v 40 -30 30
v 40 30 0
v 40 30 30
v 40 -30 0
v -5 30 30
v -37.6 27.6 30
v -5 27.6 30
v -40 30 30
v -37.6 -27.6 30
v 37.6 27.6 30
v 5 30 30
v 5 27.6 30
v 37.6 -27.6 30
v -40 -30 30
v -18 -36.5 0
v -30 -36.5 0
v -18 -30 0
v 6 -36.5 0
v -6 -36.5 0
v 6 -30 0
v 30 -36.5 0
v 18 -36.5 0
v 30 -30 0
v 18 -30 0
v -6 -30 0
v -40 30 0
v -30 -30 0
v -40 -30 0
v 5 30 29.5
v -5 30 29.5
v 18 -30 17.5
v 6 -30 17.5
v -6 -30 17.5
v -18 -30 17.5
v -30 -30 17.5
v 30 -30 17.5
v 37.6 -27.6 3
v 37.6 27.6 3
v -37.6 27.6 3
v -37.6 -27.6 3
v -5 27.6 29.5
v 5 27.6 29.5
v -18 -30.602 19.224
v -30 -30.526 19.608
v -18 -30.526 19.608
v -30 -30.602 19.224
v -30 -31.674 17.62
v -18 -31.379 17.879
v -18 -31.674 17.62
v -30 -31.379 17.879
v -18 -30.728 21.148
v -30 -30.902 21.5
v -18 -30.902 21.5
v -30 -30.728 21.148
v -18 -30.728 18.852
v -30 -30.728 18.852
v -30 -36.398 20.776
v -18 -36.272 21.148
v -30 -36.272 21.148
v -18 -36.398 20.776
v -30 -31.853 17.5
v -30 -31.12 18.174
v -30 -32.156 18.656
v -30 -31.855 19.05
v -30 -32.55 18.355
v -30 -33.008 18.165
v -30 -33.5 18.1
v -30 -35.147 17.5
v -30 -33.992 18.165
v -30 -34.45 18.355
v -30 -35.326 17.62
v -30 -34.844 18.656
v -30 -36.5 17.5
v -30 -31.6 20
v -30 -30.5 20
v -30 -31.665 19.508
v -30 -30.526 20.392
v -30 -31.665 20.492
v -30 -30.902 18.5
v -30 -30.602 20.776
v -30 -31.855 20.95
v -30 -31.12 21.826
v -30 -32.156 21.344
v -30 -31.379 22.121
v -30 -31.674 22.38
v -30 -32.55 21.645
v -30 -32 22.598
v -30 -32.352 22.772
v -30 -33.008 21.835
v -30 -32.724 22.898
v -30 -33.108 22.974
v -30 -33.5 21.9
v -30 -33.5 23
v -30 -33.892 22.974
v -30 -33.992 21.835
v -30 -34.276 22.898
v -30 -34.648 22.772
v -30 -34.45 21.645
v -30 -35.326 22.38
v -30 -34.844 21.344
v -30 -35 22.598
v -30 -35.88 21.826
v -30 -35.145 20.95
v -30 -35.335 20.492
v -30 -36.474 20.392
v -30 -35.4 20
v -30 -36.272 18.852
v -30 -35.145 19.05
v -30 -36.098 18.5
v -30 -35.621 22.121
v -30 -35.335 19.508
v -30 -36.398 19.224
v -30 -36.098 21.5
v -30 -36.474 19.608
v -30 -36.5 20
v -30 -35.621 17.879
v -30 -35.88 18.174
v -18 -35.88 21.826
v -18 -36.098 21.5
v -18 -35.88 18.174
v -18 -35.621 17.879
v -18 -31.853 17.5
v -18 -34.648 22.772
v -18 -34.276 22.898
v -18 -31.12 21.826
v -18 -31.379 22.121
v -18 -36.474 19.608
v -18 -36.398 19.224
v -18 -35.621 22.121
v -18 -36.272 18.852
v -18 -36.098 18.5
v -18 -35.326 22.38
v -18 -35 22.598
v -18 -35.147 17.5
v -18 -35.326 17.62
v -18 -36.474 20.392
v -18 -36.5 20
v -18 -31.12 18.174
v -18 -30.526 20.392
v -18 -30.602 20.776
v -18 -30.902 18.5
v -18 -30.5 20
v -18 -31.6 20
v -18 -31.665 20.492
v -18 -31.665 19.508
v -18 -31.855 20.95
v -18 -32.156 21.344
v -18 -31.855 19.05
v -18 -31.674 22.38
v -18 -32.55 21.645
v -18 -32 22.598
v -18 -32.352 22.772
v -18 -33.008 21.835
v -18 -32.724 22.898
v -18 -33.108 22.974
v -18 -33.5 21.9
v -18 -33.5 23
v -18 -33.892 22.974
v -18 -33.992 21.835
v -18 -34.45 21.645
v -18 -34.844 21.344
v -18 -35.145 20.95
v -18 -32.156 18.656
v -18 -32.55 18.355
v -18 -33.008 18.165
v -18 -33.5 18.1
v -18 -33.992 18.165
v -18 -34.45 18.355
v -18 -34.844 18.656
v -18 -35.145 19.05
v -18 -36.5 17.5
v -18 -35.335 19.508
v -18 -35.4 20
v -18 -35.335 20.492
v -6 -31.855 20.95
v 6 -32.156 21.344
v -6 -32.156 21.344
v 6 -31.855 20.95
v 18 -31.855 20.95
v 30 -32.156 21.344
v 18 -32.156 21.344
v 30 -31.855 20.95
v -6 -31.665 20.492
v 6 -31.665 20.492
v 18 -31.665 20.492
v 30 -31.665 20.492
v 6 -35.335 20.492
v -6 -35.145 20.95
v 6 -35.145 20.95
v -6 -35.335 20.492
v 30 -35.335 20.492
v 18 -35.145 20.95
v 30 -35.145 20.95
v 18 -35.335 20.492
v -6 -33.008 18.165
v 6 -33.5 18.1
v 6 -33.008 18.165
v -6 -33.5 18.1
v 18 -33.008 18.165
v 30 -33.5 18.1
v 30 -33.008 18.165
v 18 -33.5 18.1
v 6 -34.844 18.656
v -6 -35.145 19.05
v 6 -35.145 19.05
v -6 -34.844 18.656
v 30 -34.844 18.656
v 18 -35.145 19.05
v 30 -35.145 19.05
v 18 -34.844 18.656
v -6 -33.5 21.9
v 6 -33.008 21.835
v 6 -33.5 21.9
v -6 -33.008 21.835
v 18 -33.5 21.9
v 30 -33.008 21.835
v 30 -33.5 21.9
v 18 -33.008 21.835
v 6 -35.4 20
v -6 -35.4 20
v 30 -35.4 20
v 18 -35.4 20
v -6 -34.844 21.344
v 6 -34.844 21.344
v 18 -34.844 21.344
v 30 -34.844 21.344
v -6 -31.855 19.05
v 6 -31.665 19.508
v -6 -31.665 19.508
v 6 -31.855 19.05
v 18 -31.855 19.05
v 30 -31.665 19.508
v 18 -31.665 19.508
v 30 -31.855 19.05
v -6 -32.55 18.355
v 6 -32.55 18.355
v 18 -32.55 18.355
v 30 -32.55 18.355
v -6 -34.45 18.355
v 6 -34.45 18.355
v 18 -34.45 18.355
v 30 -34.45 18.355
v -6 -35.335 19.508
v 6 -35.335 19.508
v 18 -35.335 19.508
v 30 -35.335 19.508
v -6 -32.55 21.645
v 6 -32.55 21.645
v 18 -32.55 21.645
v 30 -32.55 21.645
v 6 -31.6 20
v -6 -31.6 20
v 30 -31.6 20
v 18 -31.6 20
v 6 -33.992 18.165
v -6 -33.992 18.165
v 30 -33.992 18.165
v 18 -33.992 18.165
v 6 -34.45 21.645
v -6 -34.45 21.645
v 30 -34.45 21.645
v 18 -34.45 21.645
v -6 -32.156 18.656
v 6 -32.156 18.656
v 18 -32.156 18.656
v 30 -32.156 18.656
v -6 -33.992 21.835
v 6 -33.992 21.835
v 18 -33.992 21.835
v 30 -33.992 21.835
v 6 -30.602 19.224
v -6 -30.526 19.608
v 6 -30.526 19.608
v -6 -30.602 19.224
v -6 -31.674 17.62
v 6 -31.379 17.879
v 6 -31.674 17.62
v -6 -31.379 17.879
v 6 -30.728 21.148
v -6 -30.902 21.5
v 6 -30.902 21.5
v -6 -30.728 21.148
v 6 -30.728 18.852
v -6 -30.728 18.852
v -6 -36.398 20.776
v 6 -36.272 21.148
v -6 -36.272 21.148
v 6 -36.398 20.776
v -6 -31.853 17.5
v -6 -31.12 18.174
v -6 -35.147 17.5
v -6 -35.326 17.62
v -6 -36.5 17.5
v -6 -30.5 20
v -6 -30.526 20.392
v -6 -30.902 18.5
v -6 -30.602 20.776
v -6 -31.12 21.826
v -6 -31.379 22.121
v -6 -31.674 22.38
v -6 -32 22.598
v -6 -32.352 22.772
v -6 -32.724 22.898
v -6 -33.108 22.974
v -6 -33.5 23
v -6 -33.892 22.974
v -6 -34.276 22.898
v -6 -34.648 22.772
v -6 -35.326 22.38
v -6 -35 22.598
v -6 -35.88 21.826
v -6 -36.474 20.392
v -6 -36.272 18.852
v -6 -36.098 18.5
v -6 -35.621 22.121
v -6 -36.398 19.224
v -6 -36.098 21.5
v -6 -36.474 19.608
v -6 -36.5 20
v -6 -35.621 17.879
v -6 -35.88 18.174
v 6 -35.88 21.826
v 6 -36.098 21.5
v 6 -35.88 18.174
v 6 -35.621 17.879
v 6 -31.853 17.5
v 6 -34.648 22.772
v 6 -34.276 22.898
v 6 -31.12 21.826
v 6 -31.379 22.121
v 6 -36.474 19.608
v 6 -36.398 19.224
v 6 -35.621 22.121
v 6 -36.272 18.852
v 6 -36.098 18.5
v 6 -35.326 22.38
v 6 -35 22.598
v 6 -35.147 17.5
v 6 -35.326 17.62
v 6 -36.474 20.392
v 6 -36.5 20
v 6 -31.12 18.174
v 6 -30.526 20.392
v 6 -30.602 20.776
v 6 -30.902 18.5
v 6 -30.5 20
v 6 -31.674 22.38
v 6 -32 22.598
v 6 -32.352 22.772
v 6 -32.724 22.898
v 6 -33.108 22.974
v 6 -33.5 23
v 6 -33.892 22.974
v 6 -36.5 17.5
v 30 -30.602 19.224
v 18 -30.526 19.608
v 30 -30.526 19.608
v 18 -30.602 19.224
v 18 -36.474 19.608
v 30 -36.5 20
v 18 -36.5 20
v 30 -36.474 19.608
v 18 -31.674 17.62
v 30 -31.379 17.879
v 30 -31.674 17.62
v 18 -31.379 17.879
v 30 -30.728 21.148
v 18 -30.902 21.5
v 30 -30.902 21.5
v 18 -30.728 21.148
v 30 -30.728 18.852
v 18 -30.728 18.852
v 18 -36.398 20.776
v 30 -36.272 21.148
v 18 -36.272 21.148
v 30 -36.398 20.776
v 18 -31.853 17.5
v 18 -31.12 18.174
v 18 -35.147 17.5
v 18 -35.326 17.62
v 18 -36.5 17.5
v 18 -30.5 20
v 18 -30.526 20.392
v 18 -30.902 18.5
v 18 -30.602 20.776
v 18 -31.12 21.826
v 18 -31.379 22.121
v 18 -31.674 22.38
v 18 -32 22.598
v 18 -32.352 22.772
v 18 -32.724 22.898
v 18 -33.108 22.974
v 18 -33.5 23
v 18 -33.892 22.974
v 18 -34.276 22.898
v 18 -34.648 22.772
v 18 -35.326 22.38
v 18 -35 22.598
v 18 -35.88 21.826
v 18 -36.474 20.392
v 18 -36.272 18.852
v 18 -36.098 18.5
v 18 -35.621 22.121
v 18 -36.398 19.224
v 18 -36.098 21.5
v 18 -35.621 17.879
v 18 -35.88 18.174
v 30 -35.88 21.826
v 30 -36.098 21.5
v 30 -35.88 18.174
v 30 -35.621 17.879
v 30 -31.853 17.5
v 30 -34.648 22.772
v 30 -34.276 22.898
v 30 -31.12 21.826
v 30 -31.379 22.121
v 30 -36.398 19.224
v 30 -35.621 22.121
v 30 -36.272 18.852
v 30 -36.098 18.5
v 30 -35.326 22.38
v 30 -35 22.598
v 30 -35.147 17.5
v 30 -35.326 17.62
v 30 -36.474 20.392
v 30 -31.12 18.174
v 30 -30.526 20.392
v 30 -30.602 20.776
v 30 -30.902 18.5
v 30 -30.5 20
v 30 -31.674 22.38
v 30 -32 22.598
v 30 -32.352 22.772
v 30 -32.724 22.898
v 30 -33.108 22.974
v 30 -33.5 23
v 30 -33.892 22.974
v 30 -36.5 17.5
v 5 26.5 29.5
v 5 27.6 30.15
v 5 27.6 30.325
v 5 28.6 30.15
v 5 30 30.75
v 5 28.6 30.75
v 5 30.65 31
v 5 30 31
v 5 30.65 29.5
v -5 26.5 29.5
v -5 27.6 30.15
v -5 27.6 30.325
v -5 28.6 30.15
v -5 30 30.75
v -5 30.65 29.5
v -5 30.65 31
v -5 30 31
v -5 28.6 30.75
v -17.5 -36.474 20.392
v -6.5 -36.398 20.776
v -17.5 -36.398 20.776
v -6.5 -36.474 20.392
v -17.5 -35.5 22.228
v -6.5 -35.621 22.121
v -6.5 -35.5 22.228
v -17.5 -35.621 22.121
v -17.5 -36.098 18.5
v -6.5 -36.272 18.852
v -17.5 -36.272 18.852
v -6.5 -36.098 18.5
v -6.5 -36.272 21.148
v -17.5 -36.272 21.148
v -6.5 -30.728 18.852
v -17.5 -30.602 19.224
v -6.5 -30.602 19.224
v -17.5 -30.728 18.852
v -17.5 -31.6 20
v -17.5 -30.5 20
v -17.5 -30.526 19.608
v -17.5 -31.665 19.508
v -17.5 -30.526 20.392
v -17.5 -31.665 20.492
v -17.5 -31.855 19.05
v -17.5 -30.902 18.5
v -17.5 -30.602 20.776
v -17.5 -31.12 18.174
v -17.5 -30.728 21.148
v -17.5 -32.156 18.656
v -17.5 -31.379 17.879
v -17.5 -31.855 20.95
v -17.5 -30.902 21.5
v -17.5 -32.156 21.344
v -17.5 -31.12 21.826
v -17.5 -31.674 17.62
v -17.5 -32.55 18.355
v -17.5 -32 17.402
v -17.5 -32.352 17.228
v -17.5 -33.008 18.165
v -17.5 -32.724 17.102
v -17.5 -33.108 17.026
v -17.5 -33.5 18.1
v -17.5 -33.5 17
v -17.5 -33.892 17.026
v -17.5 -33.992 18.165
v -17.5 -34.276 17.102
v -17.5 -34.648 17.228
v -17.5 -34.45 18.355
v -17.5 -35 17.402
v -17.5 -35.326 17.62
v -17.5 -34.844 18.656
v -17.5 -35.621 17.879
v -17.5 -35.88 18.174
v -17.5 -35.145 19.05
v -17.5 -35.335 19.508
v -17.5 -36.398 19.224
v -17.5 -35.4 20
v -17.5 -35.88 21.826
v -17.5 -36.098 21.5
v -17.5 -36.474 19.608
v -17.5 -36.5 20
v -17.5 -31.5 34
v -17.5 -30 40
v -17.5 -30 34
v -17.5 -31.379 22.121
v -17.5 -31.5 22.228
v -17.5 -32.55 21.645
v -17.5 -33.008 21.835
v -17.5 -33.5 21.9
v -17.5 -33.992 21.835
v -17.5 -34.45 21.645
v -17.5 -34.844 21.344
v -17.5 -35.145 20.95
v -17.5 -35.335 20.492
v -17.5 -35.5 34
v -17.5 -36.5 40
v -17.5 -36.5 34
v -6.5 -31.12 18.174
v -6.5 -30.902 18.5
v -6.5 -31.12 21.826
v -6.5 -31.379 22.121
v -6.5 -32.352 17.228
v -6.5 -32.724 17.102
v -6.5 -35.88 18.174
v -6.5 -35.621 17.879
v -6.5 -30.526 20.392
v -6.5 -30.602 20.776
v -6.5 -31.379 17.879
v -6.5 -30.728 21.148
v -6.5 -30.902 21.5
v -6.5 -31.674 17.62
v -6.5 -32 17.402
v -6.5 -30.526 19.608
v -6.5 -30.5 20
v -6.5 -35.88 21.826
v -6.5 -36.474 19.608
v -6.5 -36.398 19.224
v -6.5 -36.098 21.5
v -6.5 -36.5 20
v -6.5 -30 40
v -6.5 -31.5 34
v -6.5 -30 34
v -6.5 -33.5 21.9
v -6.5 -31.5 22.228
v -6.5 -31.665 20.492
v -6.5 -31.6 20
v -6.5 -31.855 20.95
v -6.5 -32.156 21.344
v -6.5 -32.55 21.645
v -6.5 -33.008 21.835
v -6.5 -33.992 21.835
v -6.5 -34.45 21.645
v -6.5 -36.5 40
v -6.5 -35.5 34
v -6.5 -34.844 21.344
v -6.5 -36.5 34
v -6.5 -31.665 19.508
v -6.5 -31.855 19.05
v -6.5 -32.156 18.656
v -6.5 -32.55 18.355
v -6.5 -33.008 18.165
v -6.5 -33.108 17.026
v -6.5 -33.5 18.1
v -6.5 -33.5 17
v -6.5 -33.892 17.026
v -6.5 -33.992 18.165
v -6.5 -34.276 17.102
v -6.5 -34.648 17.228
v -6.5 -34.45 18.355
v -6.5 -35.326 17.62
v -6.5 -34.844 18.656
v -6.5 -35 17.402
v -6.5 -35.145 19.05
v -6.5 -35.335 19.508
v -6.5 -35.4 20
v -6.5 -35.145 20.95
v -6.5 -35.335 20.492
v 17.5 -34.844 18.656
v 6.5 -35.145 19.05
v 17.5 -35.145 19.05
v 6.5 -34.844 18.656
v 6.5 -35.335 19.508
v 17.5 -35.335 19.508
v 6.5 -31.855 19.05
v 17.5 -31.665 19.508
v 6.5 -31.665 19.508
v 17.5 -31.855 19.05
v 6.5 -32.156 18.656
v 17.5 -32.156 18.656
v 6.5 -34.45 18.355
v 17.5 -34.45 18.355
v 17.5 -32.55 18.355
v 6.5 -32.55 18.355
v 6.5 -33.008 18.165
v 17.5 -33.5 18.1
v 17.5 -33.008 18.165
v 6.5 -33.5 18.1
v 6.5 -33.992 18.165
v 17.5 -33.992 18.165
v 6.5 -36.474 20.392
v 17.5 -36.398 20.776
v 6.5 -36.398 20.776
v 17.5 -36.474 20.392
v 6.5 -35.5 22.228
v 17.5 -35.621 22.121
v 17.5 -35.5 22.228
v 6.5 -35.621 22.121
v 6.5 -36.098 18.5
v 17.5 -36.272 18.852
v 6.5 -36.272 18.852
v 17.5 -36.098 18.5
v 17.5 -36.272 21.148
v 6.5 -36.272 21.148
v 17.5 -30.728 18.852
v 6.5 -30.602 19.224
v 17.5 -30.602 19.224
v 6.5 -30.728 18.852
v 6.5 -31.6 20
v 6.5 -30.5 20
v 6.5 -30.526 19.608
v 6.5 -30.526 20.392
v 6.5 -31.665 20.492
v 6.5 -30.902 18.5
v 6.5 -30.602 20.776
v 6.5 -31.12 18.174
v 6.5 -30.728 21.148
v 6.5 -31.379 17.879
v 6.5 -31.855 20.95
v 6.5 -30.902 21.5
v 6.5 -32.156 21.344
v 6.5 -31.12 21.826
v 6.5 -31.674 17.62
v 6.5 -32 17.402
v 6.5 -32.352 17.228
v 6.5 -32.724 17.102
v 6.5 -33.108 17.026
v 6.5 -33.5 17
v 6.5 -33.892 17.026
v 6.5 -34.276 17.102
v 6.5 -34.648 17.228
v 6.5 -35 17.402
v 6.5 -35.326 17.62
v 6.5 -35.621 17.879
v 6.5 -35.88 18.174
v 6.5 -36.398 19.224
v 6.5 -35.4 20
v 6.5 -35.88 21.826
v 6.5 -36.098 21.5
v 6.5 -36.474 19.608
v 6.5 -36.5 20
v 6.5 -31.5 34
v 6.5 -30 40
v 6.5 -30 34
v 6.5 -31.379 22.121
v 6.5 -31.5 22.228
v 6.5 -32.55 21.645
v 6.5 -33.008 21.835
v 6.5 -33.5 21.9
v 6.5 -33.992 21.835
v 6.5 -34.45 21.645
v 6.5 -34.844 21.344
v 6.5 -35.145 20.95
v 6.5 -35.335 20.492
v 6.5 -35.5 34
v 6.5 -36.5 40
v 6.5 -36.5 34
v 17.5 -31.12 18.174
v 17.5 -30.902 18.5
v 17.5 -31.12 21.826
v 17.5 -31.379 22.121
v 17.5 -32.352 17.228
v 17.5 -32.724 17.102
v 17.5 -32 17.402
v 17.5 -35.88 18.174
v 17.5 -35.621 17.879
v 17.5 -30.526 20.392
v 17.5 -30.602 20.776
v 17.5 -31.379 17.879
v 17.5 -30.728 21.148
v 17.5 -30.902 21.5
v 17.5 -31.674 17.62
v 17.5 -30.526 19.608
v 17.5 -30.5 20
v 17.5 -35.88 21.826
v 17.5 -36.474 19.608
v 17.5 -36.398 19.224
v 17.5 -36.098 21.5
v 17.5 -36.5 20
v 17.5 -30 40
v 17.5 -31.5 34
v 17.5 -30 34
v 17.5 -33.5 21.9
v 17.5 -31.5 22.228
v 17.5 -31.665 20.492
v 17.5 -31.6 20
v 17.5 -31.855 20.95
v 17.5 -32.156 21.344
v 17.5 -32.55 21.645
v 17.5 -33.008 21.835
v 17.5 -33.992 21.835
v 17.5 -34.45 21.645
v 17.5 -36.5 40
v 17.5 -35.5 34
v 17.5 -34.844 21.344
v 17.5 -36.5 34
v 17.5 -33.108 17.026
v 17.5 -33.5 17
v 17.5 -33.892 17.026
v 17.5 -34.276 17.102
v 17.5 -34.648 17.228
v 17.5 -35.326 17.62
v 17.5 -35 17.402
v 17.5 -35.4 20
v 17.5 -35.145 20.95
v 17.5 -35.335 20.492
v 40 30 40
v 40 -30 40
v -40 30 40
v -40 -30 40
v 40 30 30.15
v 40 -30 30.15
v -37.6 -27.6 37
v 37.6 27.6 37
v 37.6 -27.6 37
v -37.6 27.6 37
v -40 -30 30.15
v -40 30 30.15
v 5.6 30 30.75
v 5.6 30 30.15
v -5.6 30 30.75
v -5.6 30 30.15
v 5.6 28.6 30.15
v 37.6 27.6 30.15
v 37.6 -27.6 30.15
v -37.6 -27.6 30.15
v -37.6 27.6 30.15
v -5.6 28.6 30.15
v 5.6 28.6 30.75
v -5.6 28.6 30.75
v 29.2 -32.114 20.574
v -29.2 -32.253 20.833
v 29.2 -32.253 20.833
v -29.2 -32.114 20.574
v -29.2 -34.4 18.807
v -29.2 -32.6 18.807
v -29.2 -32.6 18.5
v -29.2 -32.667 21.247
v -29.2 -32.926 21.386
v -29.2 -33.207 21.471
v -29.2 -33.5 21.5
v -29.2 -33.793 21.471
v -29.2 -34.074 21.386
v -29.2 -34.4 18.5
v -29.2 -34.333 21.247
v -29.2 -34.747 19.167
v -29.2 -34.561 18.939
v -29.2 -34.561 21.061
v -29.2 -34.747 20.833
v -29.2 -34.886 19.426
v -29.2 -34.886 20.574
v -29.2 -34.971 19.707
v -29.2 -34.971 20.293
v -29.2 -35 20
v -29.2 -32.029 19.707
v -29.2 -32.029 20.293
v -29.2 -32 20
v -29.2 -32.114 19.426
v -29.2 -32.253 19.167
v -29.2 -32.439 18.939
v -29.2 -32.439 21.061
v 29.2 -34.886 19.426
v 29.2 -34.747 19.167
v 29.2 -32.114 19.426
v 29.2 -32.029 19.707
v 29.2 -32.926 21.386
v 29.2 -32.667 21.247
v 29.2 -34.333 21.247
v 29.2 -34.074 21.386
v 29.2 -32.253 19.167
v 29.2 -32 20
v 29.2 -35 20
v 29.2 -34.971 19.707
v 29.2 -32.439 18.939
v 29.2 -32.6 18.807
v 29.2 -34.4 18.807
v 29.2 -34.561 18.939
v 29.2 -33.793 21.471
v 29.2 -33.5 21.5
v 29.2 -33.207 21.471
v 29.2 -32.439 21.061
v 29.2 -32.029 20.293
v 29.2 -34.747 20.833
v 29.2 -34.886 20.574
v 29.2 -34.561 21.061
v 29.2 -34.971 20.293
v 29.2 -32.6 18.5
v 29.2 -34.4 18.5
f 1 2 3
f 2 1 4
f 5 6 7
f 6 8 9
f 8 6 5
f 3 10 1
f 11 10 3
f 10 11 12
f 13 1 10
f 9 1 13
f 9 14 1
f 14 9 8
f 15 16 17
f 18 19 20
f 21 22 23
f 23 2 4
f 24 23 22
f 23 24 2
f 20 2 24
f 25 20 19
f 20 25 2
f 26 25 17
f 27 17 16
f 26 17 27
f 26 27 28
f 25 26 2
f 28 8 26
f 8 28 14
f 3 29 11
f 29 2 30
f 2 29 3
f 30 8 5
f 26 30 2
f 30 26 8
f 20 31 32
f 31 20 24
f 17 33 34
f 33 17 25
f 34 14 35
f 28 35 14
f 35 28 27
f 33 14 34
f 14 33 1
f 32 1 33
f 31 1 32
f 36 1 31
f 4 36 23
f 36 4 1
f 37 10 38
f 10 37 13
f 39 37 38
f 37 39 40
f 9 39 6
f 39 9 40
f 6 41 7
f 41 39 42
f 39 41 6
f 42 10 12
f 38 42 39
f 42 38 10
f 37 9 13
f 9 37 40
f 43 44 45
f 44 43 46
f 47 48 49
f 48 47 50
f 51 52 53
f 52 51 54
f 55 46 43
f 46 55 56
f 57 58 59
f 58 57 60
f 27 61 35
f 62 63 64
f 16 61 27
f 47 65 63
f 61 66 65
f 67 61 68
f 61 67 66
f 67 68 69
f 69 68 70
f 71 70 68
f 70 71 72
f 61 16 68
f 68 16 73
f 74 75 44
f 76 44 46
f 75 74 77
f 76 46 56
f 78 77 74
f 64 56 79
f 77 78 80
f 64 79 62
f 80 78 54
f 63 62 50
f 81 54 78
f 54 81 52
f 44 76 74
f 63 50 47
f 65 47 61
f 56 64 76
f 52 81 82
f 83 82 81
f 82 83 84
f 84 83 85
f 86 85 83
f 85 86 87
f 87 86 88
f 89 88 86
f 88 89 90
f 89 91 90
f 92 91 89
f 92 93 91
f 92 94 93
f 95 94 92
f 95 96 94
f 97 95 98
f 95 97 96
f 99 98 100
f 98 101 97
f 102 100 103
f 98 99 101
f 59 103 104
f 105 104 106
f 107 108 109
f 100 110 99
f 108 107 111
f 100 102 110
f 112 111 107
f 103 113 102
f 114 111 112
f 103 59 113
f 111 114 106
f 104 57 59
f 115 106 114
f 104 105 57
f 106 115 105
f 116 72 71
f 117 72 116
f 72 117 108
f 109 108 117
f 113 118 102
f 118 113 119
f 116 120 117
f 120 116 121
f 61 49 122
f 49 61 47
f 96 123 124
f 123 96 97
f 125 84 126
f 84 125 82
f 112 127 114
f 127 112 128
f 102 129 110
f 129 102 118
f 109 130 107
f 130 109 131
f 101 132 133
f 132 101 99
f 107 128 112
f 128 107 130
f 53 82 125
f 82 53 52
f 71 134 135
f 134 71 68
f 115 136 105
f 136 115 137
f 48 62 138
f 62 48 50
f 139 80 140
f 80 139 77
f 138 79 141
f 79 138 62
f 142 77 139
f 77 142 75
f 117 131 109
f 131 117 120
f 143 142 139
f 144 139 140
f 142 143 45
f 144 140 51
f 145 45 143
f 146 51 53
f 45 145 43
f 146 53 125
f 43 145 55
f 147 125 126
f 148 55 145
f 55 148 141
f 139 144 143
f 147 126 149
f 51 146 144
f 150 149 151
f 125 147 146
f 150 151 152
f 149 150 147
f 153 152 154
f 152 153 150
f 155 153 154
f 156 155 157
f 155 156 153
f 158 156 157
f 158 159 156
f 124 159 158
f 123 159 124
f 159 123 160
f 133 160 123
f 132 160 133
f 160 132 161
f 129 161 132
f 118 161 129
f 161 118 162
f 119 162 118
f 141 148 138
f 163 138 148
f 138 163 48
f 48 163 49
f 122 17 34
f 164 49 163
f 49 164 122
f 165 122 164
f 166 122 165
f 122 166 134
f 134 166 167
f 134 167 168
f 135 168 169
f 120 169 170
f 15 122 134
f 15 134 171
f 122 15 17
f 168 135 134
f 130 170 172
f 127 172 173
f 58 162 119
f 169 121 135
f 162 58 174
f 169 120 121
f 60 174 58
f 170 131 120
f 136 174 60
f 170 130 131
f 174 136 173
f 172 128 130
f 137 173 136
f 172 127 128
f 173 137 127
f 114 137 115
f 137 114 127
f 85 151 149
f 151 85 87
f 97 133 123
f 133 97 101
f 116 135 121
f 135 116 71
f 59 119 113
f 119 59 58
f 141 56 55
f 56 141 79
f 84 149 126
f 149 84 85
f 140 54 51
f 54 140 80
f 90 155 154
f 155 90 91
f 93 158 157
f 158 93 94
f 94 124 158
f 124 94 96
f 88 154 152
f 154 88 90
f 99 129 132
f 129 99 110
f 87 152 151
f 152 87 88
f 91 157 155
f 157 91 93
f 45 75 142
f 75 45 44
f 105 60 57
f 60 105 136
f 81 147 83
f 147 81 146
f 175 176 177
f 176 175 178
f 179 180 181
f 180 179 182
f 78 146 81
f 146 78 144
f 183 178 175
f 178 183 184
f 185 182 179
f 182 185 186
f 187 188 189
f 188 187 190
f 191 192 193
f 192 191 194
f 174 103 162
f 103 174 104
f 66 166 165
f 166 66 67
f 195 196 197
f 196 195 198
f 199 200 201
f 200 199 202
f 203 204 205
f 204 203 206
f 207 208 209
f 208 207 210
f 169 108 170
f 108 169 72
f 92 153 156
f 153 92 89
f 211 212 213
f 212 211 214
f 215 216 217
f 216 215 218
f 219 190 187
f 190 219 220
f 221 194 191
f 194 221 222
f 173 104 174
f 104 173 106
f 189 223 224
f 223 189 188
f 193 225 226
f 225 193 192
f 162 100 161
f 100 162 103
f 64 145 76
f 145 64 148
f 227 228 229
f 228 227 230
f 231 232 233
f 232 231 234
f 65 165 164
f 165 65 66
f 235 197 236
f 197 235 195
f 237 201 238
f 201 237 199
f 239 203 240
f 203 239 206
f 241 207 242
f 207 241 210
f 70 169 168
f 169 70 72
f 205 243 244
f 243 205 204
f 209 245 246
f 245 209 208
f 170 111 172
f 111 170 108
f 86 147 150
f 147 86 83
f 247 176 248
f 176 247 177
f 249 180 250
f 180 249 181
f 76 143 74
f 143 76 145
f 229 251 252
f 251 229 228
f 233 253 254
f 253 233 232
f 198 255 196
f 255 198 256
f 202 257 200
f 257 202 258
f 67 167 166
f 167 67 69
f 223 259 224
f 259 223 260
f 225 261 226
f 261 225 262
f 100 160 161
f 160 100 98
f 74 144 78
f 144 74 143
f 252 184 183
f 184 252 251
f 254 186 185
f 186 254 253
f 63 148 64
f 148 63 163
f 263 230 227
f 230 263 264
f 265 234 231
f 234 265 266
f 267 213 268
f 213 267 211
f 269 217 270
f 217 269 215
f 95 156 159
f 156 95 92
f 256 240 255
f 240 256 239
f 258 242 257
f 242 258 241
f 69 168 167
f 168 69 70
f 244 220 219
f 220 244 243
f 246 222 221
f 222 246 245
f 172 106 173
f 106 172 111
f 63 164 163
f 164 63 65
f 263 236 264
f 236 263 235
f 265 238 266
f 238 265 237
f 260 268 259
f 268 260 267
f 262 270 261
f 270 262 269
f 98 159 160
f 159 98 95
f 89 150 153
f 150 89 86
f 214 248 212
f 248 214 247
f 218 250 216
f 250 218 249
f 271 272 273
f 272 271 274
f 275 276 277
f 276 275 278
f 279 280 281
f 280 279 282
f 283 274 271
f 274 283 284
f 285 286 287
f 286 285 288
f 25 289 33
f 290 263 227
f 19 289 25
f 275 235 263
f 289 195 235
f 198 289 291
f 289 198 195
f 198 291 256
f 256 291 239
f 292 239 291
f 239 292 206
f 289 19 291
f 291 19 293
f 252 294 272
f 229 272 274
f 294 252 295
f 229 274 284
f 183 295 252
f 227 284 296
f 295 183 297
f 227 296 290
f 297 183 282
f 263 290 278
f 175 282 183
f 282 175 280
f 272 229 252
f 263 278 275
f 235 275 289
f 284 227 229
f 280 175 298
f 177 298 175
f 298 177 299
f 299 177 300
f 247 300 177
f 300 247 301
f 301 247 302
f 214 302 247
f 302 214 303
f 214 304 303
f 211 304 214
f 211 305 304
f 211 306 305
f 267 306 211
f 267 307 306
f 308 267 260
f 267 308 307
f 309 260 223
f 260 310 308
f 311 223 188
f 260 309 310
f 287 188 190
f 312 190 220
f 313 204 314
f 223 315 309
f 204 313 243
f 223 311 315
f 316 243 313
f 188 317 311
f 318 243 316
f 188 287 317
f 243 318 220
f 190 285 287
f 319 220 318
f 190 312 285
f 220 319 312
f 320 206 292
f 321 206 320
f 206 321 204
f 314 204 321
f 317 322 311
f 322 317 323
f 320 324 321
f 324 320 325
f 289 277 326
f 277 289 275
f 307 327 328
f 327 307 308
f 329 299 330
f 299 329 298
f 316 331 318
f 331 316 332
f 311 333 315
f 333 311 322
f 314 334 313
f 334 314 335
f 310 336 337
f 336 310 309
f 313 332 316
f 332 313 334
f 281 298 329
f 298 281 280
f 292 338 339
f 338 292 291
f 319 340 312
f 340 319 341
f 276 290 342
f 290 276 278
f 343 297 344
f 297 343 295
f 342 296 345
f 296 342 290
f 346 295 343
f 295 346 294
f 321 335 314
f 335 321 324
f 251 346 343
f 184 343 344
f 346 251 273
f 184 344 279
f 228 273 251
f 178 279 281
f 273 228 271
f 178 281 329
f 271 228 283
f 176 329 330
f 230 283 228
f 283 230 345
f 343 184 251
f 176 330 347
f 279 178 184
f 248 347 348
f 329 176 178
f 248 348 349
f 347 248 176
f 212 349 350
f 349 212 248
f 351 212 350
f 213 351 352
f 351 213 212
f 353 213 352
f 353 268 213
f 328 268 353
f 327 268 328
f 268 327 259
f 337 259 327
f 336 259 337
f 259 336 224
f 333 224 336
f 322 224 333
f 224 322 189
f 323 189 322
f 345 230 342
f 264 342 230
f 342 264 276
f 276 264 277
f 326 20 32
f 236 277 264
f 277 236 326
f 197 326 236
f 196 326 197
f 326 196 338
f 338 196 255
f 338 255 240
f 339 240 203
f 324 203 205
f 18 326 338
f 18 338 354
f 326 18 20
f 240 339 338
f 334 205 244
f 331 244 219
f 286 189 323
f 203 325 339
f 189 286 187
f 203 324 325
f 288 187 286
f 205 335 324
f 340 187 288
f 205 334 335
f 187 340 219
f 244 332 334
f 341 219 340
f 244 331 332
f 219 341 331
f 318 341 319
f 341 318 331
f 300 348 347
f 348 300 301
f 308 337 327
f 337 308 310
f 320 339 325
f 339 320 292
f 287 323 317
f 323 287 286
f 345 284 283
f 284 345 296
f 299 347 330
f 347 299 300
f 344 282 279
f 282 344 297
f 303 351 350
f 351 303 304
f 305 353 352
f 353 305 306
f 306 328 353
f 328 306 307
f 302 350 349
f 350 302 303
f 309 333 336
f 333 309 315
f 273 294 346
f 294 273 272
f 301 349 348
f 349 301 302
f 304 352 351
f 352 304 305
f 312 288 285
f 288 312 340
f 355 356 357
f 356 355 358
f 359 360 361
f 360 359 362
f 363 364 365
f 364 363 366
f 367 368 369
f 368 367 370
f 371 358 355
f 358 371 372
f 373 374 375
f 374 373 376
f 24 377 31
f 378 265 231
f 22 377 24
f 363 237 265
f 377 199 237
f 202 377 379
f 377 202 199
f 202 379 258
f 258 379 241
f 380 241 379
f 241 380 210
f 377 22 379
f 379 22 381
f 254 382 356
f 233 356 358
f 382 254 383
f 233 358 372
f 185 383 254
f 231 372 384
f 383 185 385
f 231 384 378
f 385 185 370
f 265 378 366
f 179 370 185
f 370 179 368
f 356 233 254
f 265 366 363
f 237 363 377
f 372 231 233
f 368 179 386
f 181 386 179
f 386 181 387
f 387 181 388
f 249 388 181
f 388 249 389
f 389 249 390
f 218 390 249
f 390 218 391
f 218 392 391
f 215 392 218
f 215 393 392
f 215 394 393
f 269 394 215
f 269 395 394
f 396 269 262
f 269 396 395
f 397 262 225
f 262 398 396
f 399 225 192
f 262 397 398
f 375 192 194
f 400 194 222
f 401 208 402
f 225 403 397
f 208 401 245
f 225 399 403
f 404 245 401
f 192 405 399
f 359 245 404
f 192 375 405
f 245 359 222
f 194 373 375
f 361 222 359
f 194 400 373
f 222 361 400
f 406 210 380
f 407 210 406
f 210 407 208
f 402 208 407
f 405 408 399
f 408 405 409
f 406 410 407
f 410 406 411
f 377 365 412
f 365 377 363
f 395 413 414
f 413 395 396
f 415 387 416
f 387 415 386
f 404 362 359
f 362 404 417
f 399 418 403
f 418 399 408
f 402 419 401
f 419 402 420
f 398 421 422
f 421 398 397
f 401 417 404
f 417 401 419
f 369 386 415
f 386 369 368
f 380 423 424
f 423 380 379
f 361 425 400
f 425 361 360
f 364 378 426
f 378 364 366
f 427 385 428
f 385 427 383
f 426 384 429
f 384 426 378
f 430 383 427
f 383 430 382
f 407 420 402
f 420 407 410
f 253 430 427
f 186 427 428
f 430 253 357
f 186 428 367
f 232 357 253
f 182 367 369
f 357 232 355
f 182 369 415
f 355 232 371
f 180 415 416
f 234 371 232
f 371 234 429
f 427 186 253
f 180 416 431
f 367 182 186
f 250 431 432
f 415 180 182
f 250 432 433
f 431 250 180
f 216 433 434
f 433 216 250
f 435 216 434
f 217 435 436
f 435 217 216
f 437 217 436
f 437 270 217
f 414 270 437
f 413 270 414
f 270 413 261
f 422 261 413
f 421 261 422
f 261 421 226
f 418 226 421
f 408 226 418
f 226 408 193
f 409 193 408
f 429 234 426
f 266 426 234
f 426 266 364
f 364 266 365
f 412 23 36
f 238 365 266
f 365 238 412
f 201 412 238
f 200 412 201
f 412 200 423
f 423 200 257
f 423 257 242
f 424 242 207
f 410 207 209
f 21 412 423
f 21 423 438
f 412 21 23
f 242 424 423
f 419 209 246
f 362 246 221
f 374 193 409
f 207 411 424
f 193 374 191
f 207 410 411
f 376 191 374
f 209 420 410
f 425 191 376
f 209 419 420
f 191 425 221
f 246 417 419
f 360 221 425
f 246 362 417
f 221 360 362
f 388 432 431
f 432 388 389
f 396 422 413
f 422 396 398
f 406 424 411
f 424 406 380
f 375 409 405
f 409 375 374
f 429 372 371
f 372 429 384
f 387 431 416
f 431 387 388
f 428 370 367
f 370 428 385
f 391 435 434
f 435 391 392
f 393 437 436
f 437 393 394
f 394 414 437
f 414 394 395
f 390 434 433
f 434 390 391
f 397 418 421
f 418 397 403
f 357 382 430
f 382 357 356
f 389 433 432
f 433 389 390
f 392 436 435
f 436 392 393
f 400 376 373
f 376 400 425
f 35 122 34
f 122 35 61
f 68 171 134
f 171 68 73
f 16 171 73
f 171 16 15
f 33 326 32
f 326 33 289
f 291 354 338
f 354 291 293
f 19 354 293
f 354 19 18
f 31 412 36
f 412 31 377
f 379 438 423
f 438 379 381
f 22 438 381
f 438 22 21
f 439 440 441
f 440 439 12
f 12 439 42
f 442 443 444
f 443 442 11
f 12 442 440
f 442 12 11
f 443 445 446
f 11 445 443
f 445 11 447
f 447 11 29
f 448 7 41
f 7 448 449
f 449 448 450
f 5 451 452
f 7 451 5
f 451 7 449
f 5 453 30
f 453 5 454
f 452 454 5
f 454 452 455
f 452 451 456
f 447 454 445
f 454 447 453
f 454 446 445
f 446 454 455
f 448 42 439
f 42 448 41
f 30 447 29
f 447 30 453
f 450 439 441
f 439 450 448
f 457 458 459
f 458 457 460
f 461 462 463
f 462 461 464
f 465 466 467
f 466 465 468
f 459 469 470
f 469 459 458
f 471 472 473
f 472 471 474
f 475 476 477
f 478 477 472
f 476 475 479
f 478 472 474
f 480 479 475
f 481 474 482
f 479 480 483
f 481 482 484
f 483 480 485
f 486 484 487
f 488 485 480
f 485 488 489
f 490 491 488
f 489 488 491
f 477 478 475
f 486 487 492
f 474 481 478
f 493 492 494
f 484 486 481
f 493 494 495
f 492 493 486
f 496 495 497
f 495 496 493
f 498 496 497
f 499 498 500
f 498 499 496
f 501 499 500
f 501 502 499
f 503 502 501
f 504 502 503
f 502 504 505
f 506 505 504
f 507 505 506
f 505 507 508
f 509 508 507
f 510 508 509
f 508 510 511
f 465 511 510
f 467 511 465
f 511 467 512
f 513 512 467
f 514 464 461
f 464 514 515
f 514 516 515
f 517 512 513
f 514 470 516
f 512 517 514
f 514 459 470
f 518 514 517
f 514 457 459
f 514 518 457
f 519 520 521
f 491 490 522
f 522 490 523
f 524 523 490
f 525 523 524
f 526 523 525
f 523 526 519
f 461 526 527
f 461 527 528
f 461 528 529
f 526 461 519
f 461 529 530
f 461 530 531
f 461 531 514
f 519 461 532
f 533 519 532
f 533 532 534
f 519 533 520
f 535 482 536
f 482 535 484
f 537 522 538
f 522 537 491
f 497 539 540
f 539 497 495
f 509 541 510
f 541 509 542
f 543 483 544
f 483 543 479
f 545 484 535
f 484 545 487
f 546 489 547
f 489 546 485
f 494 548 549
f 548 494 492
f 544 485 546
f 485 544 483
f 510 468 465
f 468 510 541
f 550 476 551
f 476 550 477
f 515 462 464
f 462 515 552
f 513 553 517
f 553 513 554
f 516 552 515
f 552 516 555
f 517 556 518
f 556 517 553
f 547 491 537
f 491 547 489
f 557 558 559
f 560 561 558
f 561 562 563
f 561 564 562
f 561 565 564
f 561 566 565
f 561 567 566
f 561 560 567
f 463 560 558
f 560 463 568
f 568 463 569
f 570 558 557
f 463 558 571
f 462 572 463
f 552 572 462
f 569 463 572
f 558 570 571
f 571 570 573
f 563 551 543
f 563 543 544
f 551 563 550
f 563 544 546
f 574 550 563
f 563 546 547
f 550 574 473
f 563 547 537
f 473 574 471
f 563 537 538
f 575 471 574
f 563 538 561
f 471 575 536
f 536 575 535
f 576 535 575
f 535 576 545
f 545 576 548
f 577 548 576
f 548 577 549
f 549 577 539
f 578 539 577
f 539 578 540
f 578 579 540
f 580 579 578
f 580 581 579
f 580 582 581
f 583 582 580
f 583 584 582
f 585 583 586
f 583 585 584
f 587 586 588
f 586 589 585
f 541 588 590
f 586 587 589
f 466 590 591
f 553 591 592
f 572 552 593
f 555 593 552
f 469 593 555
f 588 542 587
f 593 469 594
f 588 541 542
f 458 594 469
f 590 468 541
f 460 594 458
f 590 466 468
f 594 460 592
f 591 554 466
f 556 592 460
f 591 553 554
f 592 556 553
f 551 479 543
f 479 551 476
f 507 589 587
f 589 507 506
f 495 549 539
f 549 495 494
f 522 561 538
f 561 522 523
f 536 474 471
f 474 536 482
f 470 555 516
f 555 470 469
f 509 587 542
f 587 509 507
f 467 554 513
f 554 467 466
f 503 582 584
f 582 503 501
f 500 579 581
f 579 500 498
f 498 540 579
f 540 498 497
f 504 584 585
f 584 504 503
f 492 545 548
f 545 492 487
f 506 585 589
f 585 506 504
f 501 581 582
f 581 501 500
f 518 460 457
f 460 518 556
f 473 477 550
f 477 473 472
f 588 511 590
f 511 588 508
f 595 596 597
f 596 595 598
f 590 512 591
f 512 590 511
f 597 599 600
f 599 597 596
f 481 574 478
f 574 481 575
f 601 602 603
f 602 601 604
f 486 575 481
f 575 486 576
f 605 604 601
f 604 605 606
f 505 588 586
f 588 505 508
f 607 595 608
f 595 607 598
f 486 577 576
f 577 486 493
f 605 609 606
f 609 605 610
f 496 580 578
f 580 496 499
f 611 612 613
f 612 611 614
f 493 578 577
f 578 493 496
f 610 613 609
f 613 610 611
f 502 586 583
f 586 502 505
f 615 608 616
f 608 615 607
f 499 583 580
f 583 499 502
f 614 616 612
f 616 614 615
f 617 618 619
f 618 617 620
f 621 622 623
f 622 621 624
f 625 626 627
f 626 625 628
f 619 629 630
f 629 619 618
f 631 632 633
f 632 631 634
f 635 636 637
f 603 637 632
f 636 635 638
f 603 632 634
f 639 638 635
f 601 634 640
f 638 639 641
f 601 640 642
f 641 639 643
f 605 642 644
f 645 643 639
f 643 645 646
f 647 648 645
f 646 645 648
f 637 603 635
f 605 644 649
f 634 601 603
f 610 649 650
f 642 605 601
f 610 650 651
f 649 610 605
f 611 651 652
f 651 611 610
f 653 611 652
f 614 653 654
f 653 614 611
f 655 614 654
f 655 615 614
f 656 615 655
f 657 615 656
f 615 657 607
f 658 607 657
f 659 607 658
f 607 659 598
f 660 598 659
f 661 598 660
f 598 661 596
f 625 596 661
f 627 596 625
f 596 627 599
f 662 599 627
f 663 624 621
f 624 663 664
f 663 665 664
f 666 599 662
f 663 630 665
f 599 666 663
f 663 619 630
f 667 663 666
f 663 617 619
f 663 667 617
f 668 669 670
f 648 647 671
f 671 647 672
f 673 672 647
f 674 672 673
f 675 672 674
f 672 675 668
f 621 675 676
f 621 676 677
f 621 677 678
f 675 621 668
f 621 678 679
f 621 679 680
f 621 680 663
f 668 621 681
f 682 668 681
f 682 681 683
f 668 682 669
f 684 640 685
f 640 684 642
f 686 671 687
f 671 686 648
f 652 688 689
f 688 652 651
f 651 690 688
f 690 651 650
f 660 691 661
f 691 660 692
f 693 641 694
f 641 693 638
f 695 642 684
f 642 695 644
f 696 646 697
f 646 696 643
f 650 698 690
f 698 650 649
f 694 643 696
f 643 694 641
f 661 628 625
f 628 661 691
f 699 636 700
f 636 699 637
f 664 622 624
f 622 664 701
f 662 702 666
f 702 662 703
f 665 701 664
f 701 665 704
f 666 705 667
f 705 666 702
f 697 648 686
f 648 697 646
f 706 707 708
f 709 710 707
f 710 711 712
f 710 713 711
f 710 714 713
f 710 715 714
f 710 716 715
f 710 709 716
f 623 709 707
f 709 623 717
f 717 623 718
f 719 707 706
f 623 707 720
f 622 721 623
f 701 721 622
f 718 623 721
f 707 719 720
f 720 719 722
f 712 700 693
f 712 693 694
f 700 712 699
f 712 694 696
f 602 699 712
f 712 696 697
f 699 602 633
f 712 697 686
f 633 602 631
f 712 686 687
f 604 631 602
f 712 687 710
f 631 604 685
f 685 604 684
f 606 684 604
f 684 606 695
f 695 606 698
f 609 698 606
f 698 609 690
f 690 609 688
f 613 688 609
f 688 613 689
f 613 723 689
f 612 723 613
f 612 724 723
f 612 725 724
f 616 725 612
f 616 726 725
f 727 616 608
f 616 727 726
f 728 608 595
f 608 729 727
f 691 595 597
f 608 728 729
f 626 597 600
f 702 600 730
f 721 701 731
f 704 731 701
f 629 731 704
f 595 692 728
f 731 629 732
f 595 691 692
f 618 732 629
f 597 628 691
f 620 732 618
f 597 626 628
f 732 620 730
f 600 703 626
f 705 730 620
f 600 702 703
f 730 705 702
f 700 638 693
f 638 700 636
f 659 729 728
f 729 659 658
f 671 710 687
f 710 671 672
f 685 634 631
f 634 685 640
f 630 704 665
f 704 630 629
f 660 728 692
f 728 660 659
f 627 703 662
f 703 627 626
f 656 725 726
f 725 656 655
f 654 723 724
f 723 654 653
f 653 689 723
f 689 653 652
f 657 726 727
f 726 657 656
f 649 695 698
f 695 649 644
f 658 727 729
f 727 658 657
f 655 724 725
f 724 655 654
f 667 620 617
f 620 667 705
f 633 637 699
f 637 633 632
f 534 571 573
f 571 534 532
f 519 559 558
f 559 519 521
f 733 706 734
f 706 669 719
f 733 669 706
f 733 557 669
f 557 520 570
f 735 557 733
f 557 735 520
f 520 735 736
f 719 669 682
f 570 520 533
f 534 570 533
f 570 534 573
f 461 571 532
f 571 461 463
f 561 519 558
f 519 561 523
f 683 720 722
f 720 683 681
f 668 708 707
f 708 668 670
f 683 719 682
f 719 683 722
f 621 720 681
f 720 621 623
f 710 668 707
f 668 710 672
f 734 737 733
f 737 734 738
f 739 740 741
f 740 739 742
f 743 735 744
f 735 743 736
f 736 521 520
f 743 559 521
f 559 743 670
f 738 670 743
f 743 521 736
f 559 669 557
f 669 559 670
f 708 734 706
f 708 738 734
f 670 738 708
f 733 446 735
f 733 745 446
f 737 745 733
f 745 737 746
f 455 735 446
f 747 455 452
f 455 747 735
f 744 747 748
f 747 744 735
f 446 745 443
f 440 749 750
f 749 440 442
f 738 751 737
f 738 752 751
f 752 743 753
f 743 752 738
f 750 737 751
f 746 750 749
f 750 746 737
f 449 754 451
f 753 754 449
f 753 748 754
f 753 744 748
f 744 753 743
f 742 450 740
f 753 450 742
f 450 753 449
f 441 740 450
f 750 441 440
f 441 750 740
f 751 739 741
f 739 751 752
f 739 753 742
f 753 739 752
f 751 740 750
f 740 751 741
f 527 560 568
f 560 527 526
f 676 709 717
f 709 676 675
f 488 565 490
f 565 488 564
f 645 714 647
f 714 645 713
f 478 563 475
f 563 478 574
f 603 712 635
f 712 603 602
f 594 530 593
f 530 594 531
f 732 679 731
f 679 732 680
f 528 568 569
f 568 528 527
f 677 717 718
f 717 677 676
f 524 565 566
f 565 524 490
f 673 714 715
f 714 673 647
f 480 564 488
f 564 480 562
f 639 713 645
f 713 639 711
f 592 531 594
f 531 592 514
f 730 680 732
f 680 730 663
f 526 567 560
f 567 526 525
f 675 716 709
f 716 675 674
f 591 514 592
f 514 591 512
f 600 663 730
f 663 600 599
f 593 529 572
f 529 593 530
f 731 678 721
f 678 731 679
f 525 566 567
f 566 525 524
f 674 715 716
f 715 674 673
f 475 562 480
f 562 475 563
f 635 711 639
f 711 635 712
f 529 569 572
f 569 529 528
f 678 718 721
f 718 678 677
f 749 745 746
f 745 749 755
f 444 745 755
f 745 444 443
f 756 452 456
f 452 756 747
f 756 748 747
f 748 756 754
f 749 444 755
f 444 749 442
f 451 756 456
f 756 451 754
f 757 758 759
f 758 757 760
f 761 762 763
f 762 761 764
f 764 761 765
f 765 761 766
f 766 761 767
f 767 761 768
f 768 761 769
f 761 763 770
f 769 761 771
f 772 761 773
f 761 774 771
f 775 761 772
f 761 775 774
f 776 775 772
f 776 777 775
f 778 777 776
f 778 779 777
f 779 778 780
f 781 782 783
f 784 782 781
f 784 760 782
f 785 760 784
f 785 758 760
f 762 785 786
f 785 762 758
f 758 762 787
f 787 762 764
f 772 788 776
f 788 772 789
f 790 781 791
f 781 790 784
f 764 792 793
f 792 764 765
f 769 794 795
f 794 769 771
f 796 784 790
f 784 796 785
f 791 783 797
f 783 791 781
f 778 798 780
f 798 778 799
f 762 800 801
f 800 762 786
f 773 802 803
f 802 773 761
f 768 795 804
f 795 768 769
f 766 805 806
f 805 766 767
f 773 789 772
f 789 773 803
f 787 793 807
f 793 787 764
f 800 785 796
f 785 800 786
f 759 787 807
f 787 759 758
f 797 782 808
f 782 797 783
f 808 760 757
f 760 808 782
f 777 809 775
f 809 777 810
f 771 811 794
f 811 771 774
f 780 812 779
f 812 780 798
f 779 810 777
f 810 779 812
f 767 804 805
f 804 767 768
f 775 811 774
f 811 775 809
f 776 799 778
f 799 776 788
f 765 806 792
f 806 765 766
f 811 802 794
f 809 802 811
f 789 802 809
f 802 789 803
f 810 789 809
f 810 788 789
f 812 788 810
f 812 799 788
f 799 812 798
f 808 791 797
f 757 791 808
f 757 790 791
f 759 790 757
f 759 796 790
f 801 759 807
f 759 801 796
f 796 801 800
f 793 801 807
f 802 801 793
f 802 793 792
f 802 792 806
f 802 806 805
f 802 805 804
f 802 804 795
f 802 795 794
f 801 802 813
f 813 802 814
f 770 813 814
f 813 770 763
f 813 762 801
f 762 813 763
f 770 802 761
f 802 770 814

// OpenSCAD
part = "assembly"; // [base, lid, pin, assembly]
cadverify_only = "";
module instance(name, part, unit = 1) {
  echo(cadverify_instance = [name, part, unit]);
  if (cadverify_only == "" || cadverify_only == name) children();
}
Ya = -33.5; Za = 20; Kr = 3.0; Br = 1.9; Pr = 1.5;
BX = [[-30,-18],[-6,6],[18,30]];
LX = [[-17.5,-6.5],[6.5,17.5]];
module barrelX(x0, x1) {
  difference() {
    translate([0,Ya,Za]) rotate([0,90,0]) translate([0,0,(x0+x1)/2])
      cylinder(h=x1-x0, r=Kr, center=true, $fn=48);
    translate([0,Ya,Za]) rotate([0,90,0]) translate([0,0,(x0+x1)/2])
      cylinder(h=(x1-x0)+1.0, r=Br, center=true, $fn=24);
  }
}
module base_geom() {
  difference() {
  union() {
    difference() {
      translate([-40,-30,0]) cube([80,60,30]);
      translate([-37.6,-27.6,3]) cube([75.2,55.2,27.01]);
    }
    for (b=BX) {
      translate([b[0],-36.5,0]) cube([b[1]-b[0],6.5,17.5]);
      barrelX(b[0], b[1]);
    }
    translate([5,0,0]) rotate([0,-90,0]) linear_extrude(height=10)
      polygon([[29.5,26.5],[31,28.5],[31,30.65],[29.5,30.65]]);
  }
  translate([0,Ya,Za]) rotate([0,90,0]) translate([0,0,0])
    cylinder(h=62, r=Br, center=true, $fn=24);
  }
}
module lid_open() {
  difference() {
    union() {
      translate([-40,-97,0]) cube([80,60,3]);
      translate([-40,-97,3]) cube([80,2.4,6.85]);
      translate([-40,-39.4,3]) cube([80,2.4,6.85]);
      translate([-40,-97,3]) cube([2.4,60,6.85]);
      translate([37.6,-97,3]) cube([2.4,60,6.85]);
      for (b=LX) {
        translate([b[0],-39,0]) cube([b[1]-b[0],8.5,6]);
        translate([b[0],-35.5,3]) cube([b[1]-b[0],4,17.5]);
        barrelX(b[0], b[1]);
      }
    }
    translate([0,Ya,Za]) rotate([0,90,0]) translate([0,0,0])
      cylinder(h=62, r=Br, center=true, $fn=24);
    translate([-5.6,-98.6,9.25]) cube([11.2,3,0.76]);
  }
}
module pin_geom() {
  union() {
    translate([-29.2,0,1.5]) rotate([0,90,0])
      cylinder(h=58.4, r=Pr, center=false, $fn=32);
    translate([-29.2,-0.9,0]) cube([58.4,1.8,0.6]);
  }
}
module lid_closed() {
  translate([0,Ya,Za]) rotate([180,0,0]) translate([0,-Ya,-Za]) lid_open();
}
module pin_placed() {
  translate([0,Ya,Za-1.5]) pin_geom();
}
if (part=="base") {
  base_geom();
  echo(cadverify_spec=[
    ["bounds", [[-40,-36.5,0],[40,31,30.65]]],
    ["bodies", 1],
    ["support_faces", [["base","-z",4000]]],
    ["overhangs_allowed", [["hinge", [[-30,-37,16],[30,-30,24]]]]],
    ["copies", 1],
    ["details", [
      ["bottom","thickness",[0,0,-1],[0,0,1],3],
      ["cavity","void",[[-37.6,-27.6,3],[37.6,27.6,30]],0.9],
      ["knuckle","material",[[-30,-36.5,17],[-18,-30.5,23]],0.5],
      ["bore","hole",[-31,-33.5,20],[1,0,0],[[0,3.8],[10,3.8]]],
      ["catch","material",[[-5,30,26.5],[5,31,30.65]],0.6]
    ]]
  ]);
} else if (part=="lid") {
  lid_open();
  echo(cadverify_spec=[
    ["bounds", [[-40,-97,0],[40,-30.5,23.5]]],
    ["bodies", 1],
    ["support_faces", [["lid","-z",4000]]],
    ["overhangs_allowed", [["hinge", [[-30,-37,16],[30,-30,24]]]]],
    ["copies", 1],
    ["details", [
      ["plate","thickness",[0,-67,-1],[0,0,1],3],
      ["pocket","void",[[-37.6,-94.6,3],[37.6,-39.4,9.85]],0.9],
      ["knuckle","material",[[-17.5,-36.5,17],[-6.5,-30.5,23]],0.8],
      ["bore","hole",[-18,-33.5,20],[1,0,0],[[0,3.8],[9,3.8]]],
      ["notch","void",[[-5.6,-97,9.25],[5.6,-95.6,9.85]],0.9]
    ]]
  ]);
} else if (part=="pin") {
  pin_geom();
  echo(cadverify_spec=[
    ["bounds", [[-29.2,-1.5,0],[29.2,1.5,3]]],
    ["bodies", 1],
    ["support_faces", [["pin","-z",50]]],
    ["overhangs_allowed", [["flanks", [[-29.2,-1.5,0],[29.2,1.5,3]]]]],
    ["copies", 1],
    ["details", [
      ["shaft","thickness",[0,5,1.5],[0,-1,0],3]
    ]]
  ]);
} else {
  instance("base","base") base_geom();
  instance("lid","lid") lid_closed();
  instance("pin","pin") pin_placed();
  echo(cadverify_spec=[
    ["bounds", [[-40,-36.5,0],[40,31,40]]],
    ["support_faces", [["bed","-z",4000]]],
    ["motions", [["swing",["lid"],"rotate",[0,-33.5,20],[1,0,0],[0,180],["flex",[["lid","base",0.5,"catch entry"]]]]]],
    ["assembly_order", [[["base"],[0,0,0]],[["lid"],[0,0,1]],[["pin"],[-1,0,0]]]],
    ["print_in_place", 0.4],
    ["print_pose", [["swing",180]]],
    ["overhangs_allowed", [["hinge", [[-30,-37,16],[30,-30,24]]]]]
  ]);
}
